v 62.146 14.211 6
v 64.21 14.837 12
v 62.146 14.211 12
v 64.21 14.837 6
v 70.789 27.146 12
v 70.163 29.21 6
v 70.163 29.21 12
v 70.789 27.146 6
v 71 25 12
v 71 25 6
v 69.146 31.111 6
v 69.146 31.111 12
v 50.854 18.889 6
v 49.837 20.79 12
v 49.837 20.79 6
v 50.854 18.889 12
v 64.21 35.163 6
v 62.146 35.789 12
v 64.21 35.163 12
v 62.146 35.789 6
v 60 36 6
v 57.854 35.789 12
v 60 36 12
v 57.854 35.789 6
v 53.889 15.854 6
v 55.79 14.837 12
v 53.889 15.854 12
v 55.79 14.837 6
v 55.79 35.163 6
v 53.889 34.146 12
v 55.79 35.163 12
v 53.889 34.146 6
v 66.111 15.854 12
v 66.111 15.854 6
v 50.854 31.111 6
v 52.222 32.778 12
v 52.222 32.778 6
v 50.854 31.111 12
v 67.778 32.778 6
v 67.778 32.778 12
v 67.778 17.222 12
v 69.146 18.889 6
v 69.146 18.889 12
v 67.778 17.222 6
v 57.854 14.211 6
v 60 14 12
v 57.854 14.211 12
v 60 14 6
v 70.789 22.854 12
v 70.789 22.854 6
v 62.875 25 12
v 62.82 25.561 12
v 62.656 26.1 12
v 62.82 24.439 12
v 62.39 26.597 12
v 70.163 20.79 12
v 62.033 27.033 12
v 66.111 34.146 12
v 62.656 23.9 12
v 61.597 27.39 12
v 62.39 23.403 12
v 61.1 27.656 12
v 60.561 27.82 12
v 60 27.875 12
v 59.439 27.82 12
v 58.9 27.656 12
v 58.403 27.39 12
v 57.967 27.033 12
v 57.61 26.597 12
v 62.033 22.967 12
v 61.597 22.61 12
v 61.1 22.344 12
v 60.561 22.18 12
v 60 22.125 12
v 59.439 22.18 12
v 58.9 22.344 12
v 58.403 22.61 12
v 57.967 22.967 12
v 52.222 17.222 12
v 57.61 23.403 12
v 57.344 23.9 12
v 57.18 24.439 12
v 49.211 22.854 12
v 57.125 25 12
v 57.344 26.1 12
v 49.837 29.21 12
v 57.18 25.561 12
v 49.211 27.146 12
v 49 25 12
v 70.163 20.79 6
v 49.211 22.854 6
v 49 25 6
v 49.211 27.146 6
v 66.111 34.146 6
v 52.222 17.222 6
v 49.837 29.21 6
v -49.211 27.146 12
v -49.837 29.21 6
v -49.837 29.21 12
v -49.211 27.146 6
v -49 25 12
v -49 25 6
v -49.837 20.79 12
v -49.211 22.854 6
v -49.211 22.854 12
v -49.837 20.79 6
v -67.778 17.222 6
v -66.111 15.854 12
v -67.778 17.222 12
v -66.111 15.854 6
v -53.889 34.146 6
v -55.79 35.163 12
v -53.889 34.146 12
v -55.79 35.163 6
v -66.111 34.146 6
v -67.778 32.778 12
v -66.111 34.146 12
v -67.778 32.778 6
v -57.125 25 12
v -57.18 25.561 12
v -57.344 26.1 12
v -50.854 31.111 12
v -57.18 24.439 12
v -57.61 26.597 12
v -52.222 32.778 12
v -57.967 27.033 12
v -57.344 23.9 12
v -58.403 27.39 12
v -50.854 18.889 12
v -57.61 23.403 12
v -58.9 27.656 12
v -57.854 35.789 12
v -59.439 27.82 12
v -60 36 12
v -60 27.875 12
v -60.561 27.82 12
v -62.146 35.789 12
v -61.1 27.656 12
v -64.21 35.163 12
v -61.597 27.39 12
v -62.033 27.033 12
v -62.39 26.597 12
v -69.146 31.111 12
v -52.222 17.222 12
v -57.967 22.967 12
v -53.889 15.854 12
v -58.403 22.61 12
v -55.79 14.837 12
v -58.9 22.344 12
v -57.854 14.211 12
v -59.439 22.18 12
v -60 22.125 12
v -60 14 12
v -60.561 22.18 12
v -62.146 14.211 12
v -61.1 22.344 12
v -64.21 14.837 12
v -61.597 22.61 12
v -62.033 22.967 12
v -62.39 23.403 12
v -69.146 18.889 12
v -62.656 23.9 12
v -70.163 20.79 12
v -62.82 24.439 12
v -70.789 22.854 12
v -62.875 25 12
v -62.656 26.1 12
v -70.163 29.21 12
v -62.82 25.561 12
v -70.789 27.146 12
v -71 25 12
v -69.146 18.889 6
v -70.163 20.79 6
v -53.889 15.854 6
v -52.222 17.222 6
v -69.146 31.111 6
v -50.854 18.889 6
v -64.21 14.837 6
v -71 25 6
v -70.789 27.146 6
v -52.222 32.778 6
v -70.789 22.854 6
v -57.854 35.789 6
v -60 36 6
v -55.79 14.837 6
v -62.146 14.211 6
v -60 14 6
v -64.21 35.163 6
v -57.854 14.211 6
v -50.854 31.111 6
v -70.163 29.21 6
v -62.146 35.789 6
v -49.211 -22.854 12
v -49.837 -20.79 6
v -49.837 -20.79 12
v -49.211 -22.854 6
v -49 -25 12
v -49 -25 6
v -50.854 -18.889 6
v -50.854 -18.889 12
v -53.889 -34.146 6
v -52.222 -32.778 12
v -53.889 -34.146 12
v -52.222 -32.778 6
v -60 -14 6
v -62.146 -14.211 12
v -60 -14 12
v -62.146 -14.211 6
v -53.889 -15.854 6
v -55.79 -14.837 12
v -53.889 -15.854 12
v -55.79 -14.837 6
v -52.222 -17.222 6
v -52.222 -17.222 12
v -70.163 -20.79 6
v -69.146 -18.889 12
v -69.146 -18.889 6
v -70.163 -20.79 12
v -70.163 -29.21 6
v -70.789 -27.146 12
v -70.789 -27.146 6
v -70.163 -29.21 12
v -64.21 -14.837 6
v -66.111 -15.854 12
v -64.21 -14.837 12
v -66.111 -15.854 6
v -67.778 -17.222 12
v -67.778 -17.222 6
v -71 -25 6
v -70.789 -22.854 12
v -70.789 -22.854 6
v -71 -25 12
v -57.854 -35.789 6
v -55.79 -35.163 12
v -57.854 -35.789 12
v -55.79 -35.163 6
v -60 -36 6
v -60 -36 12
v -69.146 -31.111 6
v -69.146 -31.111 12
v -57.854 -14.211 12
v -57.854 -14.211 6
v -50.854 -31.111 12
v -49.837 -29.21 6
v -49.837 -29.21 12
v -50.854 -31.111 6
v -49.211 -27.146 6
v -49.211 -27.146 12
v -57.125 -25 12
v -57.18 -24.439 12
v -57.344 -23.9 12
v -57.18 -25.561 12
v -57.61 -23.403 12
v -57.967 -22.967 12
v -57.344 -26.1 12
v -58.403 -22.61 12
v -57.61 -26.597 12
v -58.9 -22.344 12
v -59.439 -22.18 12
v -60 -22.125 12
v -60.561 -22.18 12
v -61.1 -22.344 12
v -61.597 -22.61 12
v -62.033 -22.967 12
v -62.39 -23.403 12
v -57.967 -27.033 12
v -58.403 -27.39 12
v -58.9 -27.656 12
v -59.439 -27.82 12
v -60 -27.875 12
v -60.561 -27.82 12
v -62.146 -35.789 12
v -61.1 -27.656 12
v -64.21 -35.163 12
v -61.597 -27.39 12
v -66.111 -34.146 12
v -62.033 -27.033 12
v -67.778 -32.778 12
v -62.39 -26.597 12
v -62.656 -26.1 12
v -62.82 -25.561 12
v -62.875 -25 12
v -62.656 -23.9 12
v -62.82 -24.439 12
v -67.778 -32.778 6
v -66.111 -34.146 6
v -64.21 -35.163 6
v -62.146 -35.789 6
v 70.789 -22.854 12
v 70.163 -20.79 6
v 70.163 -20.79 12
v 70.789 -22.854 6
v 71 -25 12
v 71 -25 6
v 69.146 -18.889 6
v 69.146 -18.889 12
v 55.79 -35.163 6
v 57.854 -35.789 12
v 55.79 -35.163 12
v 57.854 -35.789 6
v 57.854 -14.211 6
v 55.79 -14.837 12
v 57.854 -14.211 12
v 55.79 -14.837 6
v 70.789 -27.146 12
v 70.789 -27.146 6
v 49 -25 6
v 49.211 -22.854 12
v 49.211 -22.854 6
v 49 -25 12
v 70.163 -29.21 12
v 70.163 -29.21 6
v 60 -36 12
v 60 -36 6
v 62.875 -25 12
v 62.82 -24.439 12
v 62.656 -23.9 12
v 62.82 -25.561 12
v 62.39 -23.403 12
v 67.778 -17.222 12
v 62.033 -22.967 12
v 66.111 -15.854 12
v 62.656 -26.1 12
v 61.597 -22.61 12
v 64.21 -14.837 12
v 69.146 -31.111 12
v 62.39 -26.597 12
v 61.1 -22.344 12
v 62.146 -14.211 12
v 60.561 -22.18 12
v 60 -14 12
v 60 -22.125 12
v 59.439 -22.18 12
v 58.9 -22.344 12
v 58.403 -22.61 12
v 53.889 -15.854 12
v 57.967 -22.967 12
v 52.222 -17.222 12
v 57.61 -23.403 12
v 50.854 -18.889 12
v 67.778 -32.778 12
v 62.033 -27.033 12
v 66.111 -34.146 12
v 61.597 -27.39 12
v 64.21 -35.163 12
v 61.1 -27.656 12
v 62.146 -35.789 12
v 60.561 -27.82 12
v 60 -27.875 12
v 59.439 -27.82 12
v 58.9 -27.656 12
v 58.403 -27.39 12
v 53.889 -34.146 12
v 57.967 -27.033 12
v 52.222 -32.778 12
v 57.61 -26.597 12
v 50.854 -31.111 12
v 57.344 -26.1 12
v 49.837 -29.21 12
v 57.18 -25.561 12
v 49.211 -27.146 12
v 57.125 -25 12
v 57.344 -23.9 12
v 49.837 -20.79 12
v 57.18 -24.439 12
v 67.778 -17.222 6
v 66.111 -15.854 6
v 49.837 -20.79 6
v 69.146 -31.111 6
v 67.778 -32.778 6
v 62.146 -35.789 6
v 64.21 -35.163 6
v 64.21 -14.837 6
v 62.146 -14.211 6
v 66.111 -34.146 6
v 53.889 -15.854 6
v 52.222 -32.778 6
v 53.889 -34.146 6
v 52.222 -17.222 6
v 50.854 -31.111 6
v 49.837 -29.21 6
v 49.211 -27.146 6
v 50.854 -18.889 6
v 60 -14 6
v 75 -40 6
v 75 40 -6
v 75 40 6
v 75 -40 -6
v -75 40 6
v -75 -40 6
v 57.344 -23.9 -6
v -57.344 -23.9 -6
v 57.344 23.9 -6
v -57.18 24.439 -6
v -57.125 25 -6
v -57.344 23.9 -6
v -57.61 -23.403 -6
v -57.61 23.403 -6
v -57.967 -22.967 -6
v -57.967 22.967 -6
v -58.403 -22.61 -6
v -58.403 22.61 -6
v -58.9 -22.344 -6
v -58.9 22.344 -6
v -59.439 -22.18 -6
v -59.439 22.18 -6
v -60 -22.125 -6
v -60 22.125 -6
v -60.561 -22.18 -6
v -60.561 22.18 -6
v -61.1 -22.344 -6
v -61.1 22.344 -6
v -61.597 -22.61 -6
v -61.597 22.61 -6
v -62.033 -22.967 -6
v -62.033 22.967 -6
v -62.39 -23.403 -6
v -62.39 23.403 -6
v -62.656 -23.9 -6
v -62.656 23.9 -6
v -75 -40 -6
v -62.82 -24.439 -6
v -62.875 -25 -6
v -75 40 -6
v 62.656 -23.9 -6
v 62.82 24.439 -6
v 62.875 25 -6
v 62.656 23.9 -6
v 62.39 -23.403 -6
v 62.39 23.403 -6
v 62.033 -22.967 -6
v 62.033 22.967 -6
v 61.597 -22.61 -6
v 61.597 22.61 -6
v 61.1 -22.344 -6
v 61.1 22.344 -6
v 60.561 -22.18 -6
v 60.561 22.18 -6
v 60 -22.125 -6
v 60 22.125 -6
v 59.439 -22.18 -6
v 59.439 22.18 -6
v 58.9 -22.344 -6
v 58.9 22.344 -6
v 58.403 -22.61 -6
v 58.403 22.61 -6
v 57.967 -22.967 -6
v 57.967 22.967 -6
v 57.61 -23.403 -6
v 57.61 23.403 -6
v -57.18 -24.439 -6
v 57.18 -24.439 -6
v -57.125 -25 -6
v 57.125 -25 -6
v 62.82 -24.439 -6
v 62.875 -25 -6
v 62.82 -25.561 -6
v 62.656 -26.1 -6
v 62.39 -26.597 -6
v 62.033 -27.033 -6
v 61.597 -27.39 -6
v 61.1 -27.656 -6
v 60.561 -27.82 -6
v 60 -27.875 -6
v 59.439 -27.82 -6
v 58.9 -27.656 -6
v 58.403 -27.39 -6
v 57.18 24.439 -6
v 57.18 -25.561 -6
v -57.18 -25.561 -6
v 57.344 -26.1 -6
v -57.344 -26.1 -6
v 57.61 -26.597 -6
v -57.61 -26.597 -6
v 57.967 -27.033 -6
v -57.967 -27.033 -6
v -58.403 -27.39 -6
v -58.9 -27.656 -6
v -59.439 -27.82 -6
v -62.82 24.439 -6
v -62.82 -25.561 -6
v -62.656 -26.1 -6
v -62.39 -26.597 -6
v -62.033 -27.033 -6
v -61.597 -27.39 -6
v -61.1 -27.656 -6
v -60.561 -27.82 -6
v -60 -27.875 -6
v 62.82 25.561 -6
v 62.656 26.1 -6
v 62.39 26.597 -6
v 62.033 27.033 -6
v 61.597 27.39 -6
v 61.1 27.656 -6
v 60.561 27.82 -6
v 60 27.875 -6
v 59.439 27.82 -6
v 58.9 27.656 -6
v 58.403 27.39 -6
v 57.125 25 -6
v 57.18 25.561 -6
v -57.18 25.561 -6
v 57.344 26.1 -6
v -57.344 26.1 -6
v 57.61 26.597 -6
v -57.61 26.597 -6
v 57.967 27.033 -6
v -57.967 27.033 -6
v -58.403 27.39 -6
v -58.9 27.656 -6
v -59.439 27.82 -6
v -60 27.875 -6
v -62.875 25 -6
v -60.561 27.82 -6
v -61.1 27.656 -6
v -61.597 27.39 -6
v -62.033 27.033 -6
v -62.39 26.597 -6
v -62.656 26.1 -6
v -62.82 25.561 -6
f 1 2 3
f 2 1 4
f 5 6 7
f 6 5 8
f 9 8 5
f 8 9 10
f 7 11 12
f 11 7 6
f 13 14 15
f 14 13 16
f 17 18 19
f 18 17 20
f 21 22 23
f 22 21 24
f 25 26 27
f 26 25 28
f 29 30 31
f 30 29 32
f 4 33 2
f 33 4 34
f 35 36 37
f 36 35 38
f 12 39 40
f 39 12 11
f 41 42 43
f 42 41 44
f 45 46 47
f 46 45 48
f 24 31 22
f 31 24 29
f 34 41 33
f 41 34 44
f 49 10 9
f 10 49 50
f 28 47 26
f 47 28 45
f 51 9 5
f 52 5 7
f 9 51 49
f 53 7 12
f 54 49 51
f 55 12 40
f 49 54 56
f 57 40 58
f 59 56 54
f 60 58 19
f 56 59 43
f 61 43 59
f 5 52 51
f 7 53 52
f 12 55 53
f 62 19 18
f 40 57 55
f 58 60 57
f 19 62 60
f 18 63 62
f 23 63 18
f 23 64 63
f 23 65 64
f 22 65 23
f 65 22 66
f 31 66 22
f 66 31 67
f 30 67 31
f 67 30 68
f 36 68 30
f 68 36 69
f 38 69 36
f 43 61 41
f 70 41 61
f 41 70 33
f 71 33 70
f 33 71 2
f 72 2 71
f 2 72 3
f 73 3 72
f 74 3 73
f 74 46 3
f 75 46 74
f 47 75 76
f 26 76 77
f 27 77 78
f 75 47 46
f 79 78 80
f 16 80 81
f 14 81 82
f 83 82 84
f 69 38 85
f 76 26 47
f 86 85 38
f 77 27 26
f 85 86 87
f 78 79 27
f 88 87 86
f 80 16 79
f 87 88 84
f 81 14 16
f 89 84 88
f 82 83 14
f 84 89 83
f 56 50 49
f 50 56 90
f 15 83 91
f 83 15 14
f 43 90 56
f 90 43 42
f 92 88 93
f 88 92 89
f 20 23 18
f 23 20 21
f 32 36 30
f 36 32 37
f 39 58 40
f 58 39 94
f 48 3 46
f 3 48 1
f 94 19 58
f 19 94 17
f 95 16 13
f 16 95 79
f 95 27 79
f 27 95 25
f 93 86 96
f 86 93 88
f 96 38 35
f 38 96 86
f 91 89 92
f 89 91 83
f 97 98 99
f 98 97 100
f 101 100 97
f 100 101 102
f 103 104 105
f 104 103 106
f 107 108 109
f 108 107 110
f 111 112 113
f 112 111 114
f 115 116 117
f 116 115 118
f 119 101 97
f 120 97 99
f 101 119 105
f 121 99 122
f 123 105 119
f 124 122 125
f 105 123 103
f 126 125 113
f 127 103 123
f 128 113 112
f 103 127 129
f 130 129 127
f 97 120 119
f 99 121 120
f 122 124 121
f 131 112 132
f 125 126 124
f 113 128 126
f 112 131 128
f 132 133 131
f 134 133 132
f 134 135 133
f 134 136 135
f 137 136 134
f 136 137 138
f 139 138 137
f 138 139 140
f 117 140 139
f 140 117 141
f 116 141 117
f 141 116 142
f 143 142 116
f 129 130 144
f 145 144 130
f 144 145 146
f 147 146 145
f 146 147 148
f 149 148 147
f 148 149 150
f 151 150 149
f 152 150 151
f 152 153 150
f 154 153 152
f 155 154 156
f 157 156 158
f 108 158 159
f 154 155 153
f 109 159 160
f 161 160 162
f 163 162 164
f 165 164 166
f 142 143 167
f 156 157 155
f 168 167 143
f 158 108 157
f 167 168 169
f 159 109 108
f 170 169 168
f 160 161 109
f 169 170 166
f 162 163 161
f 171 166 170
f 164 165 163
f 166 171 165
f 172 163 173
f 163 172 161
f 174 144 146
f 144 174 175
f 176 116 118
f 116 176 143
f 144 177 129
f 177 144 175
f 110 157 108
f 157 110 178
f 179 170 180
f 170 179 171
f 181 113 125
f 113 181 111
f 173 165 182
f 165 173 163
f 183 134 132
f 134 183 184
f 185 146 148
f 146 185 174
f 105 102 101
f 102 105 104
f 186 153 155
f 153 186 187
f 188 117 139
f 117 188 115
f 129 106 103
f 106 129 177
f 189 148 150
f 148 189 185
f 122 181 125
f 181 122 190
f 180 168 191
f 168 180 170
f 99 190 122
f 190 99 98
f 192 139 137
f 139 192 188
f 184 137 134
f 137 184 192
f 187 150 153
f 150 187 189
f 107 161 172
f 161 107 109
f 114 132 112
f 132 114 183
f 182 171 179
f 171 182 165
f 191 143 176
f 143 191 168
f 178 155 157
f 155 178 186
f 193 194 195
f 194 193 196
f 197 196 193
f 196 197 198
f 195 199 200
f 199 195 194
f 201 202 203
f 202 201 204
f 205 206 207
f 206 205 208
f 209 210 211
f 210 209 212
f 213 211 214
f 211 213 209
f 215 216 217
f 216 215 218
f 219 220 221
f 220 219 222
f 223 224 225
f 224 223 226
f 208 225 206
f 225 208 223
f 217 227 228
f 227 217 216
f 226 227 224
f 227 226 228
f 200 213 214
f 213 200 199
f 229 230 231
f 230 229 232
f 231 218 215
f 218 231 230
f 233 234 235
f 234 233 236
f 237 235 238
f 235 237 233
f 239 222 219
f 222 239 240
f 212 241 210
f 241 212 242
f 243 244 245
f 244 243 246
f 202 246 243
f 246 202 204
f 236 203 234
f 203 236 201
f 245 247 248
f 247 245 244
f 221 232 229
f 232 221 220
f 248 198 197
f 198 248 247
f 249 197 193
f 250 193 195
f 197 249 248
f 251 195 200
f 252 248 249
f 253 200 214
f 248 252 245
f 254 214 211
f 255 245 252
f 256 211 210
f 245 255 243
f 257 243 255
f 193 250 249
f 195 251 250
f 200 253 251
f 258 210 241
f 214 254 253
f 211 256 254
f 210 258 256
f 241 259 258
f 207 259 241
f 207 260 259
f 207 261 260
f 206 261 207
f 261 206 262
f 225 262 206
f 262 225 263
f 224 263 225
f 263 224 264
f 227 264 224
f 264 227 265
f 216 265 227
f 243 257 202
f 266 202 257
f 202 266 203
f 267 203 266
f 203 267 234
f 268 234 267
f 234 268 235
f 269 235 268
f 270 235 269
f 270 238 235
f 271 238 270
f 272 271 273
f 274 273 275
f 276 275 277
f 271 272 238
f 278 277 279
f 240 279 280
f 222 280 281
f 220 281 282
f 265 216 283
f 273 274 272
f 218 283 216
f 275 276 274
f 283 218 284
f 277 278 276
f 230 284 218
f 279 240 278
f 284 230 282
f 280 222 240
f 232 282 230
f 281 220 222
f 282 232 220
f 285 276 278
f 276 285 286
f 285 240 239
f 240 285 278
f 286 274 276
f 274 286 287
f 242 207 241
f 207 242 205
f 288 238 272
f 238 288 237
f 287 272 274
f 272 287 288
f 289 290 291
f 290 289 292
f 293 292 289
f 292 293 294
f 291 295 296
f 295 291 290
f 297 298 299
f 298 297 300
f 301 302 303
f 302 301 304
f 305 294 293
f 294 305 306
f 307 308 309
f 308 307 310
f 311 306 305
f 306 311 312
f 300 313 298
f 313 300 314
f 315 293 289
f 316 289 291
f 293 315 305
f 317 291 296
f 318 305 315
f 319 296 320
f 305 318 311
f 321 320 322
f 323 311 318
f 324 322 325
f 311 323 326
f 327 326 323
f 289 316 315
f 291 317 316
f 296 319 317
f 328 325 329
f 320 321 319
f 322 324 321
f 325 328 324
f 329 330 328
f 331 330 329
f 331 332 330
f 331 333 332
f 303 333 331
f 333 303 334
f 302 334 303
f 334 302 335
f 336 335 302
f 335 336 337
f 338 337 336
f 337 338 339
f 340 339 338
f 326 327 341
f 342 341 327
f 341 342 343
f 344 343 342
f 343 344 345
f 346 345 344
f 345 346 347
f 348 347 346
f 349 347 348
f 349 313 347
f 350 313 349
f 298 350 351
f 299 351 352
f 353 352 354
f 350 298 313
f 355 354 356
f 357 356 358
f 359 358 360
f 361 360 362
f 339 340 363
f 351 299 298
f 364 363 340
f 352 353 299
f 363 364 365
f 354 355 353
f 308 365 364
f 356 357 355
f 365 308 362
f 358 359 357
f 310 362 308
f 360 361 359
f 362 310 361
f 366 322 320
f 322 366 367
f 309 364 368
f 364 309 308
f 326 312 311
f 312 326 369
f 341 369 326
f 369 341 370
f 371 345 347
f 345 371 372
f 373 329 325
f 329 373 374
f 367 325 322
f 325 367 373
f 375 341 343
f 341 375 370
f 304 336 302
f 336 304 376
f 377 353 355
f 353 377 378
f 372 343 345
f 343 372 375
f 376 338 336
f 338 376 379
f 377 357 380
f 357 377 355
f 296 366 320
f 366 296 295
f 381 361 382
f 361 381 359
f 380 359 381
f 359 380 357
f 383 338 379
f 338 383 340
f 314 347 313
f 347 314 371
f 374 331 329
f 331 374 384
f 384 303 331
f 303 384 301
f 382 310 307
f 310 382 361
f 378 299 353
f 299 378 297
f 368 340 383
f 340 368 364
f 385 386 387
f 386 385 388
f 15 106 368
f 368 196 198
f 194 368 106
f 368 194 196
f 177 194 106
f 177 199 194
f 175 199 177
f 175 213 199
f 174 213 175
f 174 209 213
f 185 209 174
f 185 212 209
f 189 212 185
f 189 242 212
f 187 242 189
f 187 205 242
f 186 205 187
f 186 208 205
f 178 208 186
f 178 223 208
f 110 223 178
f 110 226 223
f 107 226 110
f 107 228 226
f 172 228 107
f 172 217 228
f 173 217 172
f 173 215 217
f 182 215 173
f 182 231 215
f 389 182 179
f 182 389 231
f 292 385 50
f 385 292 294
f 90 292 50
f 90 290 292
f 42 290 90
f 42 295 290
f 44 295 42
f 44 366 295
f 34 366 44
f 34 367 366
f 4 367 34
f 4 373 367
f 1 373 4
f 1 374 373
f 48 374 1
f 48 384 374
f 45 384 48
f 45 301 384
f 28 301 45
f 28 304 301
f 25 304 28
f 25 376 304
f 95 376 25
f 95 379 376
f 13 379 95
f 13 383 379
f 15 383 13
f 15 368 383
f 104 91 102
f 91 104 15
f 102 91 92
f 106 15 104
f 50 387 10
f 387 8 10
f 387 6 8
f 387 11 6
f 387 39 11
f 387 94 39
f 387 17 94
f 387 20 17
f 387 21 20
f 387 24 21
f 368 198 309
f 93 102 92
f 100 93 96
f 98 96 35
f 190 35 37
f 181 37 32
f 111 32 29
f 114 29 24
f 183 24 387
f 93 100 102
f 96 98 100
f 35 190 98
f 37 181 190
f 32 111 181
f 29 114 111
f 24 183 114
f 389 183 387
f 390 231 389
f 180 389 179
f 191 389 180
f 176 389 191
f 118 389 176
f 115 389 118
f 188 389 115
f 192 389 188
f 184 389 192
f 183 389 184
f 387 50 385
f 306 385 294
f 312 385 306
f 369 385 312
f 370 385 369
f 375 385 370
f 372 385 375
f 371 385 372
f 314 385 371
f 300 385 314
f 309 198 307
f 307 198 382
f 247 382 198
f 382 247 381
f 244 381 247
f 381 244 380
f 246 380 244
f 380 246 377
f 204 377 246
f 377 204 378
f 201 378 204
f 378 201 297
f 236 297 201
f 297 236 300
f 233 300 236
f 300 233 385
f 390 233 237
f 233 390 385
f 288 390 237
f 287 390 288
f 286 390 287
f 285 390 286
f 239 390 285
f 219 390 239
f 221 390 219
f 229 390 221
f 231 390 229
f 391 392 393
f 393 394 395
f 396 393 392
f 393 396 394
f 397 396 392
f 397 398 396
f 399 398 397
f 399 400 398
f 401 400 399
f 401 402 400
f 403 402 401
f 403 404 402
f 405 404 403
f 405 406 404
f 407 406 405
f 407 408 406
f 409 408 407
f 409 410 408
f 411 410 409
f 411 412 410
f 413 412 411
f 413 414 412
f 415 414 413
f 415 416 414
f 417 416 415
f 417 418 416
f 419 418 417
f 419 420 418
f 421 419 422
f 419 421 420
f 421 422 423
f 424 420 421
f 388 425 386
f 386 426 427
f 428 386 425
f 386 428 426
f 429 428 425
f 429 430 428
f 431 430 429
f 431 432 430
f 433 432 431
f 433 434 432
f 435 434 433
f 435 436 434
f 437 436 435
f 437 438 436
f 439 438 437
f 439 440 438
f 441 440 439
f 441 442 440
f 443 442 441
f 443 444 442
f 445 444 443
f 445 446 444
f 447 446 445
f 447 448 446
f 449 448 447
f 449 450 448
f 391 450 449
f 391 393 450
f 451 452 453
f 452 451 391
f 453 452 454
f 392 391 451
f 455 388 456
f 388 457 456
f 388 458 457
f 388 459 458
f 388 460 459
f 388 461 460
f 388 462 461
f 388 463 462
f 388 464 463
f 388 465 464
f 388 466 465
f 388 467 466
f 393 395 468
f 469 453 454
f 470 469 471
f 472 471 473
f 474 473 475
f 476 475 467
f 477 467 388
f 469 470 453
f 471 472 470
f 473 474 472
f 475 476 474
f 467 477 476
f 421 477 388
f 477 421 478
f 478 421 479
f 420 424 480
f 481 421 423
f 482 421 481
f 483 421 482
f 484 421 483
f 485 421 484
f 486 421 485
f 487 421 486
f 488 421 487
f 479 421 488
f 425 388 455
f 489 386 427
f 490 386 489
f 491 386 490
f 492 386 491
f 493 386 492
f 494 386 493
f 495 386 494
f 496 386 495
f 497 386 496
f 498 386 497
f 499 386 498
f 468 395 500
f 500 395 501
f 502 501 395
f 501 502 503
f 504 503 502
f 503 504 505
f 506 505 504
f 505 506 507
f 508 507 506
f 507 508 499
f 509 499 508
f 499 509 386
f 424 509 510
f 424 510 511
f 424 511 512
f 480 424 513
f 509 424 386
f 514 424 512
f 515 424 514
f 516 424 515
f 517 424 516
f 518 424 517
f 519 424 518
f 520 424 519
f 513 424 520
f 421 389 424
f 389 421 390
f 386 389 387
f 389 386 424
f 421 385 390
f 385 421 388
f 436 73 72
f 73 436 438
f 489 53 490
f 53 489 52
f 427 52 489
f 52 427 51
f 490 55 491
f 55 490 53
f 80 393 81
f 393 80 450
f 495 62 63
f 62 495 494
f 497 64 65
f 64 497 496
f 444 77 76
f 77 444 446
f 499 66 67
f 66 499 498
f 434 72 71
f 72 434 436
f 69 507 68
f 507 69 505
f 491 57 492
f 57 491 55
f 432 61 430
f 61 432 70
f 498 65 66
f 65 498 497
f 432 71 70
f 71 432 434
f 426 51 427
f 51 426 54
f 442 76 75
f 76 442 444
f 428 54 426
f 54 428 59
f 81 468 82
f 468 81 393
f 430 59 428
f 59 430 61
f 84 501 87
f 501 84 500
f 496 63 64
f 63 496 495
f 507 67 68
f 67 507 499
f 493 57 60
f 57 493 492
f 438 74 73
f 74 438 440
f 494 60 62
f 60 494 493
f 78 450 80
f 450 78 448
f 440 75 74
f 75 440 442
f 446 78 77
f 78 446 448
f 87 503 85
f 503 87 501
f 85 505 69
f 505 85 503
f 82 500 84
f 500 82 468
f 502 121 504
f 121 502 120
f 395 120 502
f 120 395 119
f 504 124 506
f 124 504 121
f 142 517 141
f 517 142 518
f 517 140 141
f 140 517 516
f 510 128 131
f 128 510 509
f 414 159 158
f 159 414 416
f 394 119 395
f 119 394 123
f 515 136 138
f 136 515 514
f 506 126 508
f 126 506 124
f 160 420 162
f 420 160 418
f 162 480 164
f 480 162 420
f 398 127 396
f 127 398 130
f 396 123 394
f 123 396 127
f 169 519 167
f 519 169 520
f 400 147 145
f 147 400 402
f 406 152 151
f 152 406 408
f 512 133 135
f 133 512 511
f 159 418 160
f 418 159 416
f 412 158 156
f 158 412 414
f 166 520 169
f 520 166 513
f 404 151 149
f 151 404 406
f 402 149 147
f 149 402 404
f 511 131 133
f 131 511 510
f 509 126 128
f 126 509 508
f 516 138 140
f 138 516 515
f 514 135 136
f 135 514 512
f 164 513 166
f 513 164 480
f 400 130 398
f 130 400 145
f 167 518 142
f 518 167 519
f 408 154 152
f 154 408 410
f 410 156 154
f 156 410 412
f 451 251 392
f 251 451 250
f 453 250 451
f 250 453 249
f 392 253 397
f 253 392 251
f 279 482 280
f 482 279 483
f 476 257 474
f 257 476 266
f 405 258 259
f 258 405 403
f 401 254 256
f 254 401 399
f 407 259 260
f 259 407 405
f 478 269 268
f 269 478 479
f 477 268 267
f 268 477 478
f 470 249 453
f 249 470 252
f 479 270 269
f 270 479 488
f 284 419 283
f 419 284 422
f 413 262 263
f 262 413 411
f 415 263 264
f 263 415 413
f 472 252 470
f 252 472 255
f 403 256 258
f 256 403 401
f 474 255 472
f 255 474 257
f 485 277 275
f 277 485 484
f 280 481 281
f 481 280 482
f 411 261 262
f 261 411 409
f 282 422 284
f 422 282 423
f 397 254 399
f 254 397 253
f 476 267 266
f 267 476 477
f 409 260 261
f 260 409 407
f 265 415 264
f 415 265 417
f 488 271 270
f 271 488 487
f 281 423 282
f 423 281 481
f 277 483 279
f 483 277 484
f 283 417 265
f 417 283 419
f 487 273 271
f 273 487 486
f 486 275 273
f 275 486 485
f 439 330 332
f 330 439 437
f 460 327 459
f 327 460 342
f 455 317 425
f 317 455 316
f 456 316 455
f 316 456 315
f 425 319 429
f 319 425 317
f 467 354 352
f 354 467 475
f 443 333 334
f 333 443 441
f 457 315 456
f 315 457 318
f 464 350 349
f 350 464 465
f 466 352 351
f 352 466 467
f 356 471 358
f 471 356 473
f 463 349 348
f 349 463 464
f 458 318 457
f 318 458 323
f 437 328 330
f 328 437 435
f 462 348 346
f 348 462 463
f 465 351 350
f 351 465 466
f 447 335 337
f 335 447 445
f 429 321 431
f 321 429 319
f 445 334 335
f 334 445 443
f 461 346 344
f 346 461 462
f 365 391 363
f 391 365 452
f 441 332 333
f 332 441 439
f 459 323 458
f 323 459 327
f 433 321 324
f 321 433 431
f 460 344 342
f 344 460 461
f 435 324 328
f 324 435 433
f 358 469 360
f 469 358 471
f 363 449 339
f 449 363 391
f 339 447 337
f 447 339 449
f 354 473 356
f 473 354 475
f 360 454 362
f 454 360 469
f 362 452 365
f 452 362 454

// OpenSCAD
$fn = 32;

// ----------------------------------------------------------------------
// Anchor pads 150 x 80 x 18
// four corner bosses with anchor holes
// ----------------------------------------------------------------------

// --- parameters (mm) ---
plate = [150, 80, 12];   // base plate size (x, y, z)
pads = 4;                // boss count, one per corner
edge = 15;               // boss centre offset from the plate edge
boss_d = 22;             // boss diameter
boss_h = 6;              // boss height above the base plate
bore_d = 5.5;            // nominal hole diameter from the drawing
print_allowance = 0.25;  // clearance added for printing

// --- derived feature positions (mm) ---
hole_d = bore_d + print_allowance;  // = 5.75   hole diameter as printed
height = plate[2] + boss_h;         // = 18   overall height of the part
corner_x = plate[0] / 2 - edge;     // = 60   boss centre X
corner_y = plate[1] / 2 - edge;     // = 25   boss centre Y
feature_centers = [
  [corner_x, corner_y],
  [-corner_x, corner_y],
  [-corner_x, -corner_y],
  [corner_x, -corner_y]
];   // boss centres, anchor holes are drilled there

// base plate, four bosses standing on it, anchor holes all the way through
difference() {
  union() {
    cube(plate, center = true);
    for (centre = feature_centers)
      translate([centre[0], centre[1], plate[2] / 2 - 1])
        cylinder(d = boss_d, h = boss_h + 1);
  }
  for (centre = feature_centers)
    translate([centre[0], centre[1], -height])
      cylinder(d = hole_d, h = 2 * height + 2);  // through boss and plate
}
